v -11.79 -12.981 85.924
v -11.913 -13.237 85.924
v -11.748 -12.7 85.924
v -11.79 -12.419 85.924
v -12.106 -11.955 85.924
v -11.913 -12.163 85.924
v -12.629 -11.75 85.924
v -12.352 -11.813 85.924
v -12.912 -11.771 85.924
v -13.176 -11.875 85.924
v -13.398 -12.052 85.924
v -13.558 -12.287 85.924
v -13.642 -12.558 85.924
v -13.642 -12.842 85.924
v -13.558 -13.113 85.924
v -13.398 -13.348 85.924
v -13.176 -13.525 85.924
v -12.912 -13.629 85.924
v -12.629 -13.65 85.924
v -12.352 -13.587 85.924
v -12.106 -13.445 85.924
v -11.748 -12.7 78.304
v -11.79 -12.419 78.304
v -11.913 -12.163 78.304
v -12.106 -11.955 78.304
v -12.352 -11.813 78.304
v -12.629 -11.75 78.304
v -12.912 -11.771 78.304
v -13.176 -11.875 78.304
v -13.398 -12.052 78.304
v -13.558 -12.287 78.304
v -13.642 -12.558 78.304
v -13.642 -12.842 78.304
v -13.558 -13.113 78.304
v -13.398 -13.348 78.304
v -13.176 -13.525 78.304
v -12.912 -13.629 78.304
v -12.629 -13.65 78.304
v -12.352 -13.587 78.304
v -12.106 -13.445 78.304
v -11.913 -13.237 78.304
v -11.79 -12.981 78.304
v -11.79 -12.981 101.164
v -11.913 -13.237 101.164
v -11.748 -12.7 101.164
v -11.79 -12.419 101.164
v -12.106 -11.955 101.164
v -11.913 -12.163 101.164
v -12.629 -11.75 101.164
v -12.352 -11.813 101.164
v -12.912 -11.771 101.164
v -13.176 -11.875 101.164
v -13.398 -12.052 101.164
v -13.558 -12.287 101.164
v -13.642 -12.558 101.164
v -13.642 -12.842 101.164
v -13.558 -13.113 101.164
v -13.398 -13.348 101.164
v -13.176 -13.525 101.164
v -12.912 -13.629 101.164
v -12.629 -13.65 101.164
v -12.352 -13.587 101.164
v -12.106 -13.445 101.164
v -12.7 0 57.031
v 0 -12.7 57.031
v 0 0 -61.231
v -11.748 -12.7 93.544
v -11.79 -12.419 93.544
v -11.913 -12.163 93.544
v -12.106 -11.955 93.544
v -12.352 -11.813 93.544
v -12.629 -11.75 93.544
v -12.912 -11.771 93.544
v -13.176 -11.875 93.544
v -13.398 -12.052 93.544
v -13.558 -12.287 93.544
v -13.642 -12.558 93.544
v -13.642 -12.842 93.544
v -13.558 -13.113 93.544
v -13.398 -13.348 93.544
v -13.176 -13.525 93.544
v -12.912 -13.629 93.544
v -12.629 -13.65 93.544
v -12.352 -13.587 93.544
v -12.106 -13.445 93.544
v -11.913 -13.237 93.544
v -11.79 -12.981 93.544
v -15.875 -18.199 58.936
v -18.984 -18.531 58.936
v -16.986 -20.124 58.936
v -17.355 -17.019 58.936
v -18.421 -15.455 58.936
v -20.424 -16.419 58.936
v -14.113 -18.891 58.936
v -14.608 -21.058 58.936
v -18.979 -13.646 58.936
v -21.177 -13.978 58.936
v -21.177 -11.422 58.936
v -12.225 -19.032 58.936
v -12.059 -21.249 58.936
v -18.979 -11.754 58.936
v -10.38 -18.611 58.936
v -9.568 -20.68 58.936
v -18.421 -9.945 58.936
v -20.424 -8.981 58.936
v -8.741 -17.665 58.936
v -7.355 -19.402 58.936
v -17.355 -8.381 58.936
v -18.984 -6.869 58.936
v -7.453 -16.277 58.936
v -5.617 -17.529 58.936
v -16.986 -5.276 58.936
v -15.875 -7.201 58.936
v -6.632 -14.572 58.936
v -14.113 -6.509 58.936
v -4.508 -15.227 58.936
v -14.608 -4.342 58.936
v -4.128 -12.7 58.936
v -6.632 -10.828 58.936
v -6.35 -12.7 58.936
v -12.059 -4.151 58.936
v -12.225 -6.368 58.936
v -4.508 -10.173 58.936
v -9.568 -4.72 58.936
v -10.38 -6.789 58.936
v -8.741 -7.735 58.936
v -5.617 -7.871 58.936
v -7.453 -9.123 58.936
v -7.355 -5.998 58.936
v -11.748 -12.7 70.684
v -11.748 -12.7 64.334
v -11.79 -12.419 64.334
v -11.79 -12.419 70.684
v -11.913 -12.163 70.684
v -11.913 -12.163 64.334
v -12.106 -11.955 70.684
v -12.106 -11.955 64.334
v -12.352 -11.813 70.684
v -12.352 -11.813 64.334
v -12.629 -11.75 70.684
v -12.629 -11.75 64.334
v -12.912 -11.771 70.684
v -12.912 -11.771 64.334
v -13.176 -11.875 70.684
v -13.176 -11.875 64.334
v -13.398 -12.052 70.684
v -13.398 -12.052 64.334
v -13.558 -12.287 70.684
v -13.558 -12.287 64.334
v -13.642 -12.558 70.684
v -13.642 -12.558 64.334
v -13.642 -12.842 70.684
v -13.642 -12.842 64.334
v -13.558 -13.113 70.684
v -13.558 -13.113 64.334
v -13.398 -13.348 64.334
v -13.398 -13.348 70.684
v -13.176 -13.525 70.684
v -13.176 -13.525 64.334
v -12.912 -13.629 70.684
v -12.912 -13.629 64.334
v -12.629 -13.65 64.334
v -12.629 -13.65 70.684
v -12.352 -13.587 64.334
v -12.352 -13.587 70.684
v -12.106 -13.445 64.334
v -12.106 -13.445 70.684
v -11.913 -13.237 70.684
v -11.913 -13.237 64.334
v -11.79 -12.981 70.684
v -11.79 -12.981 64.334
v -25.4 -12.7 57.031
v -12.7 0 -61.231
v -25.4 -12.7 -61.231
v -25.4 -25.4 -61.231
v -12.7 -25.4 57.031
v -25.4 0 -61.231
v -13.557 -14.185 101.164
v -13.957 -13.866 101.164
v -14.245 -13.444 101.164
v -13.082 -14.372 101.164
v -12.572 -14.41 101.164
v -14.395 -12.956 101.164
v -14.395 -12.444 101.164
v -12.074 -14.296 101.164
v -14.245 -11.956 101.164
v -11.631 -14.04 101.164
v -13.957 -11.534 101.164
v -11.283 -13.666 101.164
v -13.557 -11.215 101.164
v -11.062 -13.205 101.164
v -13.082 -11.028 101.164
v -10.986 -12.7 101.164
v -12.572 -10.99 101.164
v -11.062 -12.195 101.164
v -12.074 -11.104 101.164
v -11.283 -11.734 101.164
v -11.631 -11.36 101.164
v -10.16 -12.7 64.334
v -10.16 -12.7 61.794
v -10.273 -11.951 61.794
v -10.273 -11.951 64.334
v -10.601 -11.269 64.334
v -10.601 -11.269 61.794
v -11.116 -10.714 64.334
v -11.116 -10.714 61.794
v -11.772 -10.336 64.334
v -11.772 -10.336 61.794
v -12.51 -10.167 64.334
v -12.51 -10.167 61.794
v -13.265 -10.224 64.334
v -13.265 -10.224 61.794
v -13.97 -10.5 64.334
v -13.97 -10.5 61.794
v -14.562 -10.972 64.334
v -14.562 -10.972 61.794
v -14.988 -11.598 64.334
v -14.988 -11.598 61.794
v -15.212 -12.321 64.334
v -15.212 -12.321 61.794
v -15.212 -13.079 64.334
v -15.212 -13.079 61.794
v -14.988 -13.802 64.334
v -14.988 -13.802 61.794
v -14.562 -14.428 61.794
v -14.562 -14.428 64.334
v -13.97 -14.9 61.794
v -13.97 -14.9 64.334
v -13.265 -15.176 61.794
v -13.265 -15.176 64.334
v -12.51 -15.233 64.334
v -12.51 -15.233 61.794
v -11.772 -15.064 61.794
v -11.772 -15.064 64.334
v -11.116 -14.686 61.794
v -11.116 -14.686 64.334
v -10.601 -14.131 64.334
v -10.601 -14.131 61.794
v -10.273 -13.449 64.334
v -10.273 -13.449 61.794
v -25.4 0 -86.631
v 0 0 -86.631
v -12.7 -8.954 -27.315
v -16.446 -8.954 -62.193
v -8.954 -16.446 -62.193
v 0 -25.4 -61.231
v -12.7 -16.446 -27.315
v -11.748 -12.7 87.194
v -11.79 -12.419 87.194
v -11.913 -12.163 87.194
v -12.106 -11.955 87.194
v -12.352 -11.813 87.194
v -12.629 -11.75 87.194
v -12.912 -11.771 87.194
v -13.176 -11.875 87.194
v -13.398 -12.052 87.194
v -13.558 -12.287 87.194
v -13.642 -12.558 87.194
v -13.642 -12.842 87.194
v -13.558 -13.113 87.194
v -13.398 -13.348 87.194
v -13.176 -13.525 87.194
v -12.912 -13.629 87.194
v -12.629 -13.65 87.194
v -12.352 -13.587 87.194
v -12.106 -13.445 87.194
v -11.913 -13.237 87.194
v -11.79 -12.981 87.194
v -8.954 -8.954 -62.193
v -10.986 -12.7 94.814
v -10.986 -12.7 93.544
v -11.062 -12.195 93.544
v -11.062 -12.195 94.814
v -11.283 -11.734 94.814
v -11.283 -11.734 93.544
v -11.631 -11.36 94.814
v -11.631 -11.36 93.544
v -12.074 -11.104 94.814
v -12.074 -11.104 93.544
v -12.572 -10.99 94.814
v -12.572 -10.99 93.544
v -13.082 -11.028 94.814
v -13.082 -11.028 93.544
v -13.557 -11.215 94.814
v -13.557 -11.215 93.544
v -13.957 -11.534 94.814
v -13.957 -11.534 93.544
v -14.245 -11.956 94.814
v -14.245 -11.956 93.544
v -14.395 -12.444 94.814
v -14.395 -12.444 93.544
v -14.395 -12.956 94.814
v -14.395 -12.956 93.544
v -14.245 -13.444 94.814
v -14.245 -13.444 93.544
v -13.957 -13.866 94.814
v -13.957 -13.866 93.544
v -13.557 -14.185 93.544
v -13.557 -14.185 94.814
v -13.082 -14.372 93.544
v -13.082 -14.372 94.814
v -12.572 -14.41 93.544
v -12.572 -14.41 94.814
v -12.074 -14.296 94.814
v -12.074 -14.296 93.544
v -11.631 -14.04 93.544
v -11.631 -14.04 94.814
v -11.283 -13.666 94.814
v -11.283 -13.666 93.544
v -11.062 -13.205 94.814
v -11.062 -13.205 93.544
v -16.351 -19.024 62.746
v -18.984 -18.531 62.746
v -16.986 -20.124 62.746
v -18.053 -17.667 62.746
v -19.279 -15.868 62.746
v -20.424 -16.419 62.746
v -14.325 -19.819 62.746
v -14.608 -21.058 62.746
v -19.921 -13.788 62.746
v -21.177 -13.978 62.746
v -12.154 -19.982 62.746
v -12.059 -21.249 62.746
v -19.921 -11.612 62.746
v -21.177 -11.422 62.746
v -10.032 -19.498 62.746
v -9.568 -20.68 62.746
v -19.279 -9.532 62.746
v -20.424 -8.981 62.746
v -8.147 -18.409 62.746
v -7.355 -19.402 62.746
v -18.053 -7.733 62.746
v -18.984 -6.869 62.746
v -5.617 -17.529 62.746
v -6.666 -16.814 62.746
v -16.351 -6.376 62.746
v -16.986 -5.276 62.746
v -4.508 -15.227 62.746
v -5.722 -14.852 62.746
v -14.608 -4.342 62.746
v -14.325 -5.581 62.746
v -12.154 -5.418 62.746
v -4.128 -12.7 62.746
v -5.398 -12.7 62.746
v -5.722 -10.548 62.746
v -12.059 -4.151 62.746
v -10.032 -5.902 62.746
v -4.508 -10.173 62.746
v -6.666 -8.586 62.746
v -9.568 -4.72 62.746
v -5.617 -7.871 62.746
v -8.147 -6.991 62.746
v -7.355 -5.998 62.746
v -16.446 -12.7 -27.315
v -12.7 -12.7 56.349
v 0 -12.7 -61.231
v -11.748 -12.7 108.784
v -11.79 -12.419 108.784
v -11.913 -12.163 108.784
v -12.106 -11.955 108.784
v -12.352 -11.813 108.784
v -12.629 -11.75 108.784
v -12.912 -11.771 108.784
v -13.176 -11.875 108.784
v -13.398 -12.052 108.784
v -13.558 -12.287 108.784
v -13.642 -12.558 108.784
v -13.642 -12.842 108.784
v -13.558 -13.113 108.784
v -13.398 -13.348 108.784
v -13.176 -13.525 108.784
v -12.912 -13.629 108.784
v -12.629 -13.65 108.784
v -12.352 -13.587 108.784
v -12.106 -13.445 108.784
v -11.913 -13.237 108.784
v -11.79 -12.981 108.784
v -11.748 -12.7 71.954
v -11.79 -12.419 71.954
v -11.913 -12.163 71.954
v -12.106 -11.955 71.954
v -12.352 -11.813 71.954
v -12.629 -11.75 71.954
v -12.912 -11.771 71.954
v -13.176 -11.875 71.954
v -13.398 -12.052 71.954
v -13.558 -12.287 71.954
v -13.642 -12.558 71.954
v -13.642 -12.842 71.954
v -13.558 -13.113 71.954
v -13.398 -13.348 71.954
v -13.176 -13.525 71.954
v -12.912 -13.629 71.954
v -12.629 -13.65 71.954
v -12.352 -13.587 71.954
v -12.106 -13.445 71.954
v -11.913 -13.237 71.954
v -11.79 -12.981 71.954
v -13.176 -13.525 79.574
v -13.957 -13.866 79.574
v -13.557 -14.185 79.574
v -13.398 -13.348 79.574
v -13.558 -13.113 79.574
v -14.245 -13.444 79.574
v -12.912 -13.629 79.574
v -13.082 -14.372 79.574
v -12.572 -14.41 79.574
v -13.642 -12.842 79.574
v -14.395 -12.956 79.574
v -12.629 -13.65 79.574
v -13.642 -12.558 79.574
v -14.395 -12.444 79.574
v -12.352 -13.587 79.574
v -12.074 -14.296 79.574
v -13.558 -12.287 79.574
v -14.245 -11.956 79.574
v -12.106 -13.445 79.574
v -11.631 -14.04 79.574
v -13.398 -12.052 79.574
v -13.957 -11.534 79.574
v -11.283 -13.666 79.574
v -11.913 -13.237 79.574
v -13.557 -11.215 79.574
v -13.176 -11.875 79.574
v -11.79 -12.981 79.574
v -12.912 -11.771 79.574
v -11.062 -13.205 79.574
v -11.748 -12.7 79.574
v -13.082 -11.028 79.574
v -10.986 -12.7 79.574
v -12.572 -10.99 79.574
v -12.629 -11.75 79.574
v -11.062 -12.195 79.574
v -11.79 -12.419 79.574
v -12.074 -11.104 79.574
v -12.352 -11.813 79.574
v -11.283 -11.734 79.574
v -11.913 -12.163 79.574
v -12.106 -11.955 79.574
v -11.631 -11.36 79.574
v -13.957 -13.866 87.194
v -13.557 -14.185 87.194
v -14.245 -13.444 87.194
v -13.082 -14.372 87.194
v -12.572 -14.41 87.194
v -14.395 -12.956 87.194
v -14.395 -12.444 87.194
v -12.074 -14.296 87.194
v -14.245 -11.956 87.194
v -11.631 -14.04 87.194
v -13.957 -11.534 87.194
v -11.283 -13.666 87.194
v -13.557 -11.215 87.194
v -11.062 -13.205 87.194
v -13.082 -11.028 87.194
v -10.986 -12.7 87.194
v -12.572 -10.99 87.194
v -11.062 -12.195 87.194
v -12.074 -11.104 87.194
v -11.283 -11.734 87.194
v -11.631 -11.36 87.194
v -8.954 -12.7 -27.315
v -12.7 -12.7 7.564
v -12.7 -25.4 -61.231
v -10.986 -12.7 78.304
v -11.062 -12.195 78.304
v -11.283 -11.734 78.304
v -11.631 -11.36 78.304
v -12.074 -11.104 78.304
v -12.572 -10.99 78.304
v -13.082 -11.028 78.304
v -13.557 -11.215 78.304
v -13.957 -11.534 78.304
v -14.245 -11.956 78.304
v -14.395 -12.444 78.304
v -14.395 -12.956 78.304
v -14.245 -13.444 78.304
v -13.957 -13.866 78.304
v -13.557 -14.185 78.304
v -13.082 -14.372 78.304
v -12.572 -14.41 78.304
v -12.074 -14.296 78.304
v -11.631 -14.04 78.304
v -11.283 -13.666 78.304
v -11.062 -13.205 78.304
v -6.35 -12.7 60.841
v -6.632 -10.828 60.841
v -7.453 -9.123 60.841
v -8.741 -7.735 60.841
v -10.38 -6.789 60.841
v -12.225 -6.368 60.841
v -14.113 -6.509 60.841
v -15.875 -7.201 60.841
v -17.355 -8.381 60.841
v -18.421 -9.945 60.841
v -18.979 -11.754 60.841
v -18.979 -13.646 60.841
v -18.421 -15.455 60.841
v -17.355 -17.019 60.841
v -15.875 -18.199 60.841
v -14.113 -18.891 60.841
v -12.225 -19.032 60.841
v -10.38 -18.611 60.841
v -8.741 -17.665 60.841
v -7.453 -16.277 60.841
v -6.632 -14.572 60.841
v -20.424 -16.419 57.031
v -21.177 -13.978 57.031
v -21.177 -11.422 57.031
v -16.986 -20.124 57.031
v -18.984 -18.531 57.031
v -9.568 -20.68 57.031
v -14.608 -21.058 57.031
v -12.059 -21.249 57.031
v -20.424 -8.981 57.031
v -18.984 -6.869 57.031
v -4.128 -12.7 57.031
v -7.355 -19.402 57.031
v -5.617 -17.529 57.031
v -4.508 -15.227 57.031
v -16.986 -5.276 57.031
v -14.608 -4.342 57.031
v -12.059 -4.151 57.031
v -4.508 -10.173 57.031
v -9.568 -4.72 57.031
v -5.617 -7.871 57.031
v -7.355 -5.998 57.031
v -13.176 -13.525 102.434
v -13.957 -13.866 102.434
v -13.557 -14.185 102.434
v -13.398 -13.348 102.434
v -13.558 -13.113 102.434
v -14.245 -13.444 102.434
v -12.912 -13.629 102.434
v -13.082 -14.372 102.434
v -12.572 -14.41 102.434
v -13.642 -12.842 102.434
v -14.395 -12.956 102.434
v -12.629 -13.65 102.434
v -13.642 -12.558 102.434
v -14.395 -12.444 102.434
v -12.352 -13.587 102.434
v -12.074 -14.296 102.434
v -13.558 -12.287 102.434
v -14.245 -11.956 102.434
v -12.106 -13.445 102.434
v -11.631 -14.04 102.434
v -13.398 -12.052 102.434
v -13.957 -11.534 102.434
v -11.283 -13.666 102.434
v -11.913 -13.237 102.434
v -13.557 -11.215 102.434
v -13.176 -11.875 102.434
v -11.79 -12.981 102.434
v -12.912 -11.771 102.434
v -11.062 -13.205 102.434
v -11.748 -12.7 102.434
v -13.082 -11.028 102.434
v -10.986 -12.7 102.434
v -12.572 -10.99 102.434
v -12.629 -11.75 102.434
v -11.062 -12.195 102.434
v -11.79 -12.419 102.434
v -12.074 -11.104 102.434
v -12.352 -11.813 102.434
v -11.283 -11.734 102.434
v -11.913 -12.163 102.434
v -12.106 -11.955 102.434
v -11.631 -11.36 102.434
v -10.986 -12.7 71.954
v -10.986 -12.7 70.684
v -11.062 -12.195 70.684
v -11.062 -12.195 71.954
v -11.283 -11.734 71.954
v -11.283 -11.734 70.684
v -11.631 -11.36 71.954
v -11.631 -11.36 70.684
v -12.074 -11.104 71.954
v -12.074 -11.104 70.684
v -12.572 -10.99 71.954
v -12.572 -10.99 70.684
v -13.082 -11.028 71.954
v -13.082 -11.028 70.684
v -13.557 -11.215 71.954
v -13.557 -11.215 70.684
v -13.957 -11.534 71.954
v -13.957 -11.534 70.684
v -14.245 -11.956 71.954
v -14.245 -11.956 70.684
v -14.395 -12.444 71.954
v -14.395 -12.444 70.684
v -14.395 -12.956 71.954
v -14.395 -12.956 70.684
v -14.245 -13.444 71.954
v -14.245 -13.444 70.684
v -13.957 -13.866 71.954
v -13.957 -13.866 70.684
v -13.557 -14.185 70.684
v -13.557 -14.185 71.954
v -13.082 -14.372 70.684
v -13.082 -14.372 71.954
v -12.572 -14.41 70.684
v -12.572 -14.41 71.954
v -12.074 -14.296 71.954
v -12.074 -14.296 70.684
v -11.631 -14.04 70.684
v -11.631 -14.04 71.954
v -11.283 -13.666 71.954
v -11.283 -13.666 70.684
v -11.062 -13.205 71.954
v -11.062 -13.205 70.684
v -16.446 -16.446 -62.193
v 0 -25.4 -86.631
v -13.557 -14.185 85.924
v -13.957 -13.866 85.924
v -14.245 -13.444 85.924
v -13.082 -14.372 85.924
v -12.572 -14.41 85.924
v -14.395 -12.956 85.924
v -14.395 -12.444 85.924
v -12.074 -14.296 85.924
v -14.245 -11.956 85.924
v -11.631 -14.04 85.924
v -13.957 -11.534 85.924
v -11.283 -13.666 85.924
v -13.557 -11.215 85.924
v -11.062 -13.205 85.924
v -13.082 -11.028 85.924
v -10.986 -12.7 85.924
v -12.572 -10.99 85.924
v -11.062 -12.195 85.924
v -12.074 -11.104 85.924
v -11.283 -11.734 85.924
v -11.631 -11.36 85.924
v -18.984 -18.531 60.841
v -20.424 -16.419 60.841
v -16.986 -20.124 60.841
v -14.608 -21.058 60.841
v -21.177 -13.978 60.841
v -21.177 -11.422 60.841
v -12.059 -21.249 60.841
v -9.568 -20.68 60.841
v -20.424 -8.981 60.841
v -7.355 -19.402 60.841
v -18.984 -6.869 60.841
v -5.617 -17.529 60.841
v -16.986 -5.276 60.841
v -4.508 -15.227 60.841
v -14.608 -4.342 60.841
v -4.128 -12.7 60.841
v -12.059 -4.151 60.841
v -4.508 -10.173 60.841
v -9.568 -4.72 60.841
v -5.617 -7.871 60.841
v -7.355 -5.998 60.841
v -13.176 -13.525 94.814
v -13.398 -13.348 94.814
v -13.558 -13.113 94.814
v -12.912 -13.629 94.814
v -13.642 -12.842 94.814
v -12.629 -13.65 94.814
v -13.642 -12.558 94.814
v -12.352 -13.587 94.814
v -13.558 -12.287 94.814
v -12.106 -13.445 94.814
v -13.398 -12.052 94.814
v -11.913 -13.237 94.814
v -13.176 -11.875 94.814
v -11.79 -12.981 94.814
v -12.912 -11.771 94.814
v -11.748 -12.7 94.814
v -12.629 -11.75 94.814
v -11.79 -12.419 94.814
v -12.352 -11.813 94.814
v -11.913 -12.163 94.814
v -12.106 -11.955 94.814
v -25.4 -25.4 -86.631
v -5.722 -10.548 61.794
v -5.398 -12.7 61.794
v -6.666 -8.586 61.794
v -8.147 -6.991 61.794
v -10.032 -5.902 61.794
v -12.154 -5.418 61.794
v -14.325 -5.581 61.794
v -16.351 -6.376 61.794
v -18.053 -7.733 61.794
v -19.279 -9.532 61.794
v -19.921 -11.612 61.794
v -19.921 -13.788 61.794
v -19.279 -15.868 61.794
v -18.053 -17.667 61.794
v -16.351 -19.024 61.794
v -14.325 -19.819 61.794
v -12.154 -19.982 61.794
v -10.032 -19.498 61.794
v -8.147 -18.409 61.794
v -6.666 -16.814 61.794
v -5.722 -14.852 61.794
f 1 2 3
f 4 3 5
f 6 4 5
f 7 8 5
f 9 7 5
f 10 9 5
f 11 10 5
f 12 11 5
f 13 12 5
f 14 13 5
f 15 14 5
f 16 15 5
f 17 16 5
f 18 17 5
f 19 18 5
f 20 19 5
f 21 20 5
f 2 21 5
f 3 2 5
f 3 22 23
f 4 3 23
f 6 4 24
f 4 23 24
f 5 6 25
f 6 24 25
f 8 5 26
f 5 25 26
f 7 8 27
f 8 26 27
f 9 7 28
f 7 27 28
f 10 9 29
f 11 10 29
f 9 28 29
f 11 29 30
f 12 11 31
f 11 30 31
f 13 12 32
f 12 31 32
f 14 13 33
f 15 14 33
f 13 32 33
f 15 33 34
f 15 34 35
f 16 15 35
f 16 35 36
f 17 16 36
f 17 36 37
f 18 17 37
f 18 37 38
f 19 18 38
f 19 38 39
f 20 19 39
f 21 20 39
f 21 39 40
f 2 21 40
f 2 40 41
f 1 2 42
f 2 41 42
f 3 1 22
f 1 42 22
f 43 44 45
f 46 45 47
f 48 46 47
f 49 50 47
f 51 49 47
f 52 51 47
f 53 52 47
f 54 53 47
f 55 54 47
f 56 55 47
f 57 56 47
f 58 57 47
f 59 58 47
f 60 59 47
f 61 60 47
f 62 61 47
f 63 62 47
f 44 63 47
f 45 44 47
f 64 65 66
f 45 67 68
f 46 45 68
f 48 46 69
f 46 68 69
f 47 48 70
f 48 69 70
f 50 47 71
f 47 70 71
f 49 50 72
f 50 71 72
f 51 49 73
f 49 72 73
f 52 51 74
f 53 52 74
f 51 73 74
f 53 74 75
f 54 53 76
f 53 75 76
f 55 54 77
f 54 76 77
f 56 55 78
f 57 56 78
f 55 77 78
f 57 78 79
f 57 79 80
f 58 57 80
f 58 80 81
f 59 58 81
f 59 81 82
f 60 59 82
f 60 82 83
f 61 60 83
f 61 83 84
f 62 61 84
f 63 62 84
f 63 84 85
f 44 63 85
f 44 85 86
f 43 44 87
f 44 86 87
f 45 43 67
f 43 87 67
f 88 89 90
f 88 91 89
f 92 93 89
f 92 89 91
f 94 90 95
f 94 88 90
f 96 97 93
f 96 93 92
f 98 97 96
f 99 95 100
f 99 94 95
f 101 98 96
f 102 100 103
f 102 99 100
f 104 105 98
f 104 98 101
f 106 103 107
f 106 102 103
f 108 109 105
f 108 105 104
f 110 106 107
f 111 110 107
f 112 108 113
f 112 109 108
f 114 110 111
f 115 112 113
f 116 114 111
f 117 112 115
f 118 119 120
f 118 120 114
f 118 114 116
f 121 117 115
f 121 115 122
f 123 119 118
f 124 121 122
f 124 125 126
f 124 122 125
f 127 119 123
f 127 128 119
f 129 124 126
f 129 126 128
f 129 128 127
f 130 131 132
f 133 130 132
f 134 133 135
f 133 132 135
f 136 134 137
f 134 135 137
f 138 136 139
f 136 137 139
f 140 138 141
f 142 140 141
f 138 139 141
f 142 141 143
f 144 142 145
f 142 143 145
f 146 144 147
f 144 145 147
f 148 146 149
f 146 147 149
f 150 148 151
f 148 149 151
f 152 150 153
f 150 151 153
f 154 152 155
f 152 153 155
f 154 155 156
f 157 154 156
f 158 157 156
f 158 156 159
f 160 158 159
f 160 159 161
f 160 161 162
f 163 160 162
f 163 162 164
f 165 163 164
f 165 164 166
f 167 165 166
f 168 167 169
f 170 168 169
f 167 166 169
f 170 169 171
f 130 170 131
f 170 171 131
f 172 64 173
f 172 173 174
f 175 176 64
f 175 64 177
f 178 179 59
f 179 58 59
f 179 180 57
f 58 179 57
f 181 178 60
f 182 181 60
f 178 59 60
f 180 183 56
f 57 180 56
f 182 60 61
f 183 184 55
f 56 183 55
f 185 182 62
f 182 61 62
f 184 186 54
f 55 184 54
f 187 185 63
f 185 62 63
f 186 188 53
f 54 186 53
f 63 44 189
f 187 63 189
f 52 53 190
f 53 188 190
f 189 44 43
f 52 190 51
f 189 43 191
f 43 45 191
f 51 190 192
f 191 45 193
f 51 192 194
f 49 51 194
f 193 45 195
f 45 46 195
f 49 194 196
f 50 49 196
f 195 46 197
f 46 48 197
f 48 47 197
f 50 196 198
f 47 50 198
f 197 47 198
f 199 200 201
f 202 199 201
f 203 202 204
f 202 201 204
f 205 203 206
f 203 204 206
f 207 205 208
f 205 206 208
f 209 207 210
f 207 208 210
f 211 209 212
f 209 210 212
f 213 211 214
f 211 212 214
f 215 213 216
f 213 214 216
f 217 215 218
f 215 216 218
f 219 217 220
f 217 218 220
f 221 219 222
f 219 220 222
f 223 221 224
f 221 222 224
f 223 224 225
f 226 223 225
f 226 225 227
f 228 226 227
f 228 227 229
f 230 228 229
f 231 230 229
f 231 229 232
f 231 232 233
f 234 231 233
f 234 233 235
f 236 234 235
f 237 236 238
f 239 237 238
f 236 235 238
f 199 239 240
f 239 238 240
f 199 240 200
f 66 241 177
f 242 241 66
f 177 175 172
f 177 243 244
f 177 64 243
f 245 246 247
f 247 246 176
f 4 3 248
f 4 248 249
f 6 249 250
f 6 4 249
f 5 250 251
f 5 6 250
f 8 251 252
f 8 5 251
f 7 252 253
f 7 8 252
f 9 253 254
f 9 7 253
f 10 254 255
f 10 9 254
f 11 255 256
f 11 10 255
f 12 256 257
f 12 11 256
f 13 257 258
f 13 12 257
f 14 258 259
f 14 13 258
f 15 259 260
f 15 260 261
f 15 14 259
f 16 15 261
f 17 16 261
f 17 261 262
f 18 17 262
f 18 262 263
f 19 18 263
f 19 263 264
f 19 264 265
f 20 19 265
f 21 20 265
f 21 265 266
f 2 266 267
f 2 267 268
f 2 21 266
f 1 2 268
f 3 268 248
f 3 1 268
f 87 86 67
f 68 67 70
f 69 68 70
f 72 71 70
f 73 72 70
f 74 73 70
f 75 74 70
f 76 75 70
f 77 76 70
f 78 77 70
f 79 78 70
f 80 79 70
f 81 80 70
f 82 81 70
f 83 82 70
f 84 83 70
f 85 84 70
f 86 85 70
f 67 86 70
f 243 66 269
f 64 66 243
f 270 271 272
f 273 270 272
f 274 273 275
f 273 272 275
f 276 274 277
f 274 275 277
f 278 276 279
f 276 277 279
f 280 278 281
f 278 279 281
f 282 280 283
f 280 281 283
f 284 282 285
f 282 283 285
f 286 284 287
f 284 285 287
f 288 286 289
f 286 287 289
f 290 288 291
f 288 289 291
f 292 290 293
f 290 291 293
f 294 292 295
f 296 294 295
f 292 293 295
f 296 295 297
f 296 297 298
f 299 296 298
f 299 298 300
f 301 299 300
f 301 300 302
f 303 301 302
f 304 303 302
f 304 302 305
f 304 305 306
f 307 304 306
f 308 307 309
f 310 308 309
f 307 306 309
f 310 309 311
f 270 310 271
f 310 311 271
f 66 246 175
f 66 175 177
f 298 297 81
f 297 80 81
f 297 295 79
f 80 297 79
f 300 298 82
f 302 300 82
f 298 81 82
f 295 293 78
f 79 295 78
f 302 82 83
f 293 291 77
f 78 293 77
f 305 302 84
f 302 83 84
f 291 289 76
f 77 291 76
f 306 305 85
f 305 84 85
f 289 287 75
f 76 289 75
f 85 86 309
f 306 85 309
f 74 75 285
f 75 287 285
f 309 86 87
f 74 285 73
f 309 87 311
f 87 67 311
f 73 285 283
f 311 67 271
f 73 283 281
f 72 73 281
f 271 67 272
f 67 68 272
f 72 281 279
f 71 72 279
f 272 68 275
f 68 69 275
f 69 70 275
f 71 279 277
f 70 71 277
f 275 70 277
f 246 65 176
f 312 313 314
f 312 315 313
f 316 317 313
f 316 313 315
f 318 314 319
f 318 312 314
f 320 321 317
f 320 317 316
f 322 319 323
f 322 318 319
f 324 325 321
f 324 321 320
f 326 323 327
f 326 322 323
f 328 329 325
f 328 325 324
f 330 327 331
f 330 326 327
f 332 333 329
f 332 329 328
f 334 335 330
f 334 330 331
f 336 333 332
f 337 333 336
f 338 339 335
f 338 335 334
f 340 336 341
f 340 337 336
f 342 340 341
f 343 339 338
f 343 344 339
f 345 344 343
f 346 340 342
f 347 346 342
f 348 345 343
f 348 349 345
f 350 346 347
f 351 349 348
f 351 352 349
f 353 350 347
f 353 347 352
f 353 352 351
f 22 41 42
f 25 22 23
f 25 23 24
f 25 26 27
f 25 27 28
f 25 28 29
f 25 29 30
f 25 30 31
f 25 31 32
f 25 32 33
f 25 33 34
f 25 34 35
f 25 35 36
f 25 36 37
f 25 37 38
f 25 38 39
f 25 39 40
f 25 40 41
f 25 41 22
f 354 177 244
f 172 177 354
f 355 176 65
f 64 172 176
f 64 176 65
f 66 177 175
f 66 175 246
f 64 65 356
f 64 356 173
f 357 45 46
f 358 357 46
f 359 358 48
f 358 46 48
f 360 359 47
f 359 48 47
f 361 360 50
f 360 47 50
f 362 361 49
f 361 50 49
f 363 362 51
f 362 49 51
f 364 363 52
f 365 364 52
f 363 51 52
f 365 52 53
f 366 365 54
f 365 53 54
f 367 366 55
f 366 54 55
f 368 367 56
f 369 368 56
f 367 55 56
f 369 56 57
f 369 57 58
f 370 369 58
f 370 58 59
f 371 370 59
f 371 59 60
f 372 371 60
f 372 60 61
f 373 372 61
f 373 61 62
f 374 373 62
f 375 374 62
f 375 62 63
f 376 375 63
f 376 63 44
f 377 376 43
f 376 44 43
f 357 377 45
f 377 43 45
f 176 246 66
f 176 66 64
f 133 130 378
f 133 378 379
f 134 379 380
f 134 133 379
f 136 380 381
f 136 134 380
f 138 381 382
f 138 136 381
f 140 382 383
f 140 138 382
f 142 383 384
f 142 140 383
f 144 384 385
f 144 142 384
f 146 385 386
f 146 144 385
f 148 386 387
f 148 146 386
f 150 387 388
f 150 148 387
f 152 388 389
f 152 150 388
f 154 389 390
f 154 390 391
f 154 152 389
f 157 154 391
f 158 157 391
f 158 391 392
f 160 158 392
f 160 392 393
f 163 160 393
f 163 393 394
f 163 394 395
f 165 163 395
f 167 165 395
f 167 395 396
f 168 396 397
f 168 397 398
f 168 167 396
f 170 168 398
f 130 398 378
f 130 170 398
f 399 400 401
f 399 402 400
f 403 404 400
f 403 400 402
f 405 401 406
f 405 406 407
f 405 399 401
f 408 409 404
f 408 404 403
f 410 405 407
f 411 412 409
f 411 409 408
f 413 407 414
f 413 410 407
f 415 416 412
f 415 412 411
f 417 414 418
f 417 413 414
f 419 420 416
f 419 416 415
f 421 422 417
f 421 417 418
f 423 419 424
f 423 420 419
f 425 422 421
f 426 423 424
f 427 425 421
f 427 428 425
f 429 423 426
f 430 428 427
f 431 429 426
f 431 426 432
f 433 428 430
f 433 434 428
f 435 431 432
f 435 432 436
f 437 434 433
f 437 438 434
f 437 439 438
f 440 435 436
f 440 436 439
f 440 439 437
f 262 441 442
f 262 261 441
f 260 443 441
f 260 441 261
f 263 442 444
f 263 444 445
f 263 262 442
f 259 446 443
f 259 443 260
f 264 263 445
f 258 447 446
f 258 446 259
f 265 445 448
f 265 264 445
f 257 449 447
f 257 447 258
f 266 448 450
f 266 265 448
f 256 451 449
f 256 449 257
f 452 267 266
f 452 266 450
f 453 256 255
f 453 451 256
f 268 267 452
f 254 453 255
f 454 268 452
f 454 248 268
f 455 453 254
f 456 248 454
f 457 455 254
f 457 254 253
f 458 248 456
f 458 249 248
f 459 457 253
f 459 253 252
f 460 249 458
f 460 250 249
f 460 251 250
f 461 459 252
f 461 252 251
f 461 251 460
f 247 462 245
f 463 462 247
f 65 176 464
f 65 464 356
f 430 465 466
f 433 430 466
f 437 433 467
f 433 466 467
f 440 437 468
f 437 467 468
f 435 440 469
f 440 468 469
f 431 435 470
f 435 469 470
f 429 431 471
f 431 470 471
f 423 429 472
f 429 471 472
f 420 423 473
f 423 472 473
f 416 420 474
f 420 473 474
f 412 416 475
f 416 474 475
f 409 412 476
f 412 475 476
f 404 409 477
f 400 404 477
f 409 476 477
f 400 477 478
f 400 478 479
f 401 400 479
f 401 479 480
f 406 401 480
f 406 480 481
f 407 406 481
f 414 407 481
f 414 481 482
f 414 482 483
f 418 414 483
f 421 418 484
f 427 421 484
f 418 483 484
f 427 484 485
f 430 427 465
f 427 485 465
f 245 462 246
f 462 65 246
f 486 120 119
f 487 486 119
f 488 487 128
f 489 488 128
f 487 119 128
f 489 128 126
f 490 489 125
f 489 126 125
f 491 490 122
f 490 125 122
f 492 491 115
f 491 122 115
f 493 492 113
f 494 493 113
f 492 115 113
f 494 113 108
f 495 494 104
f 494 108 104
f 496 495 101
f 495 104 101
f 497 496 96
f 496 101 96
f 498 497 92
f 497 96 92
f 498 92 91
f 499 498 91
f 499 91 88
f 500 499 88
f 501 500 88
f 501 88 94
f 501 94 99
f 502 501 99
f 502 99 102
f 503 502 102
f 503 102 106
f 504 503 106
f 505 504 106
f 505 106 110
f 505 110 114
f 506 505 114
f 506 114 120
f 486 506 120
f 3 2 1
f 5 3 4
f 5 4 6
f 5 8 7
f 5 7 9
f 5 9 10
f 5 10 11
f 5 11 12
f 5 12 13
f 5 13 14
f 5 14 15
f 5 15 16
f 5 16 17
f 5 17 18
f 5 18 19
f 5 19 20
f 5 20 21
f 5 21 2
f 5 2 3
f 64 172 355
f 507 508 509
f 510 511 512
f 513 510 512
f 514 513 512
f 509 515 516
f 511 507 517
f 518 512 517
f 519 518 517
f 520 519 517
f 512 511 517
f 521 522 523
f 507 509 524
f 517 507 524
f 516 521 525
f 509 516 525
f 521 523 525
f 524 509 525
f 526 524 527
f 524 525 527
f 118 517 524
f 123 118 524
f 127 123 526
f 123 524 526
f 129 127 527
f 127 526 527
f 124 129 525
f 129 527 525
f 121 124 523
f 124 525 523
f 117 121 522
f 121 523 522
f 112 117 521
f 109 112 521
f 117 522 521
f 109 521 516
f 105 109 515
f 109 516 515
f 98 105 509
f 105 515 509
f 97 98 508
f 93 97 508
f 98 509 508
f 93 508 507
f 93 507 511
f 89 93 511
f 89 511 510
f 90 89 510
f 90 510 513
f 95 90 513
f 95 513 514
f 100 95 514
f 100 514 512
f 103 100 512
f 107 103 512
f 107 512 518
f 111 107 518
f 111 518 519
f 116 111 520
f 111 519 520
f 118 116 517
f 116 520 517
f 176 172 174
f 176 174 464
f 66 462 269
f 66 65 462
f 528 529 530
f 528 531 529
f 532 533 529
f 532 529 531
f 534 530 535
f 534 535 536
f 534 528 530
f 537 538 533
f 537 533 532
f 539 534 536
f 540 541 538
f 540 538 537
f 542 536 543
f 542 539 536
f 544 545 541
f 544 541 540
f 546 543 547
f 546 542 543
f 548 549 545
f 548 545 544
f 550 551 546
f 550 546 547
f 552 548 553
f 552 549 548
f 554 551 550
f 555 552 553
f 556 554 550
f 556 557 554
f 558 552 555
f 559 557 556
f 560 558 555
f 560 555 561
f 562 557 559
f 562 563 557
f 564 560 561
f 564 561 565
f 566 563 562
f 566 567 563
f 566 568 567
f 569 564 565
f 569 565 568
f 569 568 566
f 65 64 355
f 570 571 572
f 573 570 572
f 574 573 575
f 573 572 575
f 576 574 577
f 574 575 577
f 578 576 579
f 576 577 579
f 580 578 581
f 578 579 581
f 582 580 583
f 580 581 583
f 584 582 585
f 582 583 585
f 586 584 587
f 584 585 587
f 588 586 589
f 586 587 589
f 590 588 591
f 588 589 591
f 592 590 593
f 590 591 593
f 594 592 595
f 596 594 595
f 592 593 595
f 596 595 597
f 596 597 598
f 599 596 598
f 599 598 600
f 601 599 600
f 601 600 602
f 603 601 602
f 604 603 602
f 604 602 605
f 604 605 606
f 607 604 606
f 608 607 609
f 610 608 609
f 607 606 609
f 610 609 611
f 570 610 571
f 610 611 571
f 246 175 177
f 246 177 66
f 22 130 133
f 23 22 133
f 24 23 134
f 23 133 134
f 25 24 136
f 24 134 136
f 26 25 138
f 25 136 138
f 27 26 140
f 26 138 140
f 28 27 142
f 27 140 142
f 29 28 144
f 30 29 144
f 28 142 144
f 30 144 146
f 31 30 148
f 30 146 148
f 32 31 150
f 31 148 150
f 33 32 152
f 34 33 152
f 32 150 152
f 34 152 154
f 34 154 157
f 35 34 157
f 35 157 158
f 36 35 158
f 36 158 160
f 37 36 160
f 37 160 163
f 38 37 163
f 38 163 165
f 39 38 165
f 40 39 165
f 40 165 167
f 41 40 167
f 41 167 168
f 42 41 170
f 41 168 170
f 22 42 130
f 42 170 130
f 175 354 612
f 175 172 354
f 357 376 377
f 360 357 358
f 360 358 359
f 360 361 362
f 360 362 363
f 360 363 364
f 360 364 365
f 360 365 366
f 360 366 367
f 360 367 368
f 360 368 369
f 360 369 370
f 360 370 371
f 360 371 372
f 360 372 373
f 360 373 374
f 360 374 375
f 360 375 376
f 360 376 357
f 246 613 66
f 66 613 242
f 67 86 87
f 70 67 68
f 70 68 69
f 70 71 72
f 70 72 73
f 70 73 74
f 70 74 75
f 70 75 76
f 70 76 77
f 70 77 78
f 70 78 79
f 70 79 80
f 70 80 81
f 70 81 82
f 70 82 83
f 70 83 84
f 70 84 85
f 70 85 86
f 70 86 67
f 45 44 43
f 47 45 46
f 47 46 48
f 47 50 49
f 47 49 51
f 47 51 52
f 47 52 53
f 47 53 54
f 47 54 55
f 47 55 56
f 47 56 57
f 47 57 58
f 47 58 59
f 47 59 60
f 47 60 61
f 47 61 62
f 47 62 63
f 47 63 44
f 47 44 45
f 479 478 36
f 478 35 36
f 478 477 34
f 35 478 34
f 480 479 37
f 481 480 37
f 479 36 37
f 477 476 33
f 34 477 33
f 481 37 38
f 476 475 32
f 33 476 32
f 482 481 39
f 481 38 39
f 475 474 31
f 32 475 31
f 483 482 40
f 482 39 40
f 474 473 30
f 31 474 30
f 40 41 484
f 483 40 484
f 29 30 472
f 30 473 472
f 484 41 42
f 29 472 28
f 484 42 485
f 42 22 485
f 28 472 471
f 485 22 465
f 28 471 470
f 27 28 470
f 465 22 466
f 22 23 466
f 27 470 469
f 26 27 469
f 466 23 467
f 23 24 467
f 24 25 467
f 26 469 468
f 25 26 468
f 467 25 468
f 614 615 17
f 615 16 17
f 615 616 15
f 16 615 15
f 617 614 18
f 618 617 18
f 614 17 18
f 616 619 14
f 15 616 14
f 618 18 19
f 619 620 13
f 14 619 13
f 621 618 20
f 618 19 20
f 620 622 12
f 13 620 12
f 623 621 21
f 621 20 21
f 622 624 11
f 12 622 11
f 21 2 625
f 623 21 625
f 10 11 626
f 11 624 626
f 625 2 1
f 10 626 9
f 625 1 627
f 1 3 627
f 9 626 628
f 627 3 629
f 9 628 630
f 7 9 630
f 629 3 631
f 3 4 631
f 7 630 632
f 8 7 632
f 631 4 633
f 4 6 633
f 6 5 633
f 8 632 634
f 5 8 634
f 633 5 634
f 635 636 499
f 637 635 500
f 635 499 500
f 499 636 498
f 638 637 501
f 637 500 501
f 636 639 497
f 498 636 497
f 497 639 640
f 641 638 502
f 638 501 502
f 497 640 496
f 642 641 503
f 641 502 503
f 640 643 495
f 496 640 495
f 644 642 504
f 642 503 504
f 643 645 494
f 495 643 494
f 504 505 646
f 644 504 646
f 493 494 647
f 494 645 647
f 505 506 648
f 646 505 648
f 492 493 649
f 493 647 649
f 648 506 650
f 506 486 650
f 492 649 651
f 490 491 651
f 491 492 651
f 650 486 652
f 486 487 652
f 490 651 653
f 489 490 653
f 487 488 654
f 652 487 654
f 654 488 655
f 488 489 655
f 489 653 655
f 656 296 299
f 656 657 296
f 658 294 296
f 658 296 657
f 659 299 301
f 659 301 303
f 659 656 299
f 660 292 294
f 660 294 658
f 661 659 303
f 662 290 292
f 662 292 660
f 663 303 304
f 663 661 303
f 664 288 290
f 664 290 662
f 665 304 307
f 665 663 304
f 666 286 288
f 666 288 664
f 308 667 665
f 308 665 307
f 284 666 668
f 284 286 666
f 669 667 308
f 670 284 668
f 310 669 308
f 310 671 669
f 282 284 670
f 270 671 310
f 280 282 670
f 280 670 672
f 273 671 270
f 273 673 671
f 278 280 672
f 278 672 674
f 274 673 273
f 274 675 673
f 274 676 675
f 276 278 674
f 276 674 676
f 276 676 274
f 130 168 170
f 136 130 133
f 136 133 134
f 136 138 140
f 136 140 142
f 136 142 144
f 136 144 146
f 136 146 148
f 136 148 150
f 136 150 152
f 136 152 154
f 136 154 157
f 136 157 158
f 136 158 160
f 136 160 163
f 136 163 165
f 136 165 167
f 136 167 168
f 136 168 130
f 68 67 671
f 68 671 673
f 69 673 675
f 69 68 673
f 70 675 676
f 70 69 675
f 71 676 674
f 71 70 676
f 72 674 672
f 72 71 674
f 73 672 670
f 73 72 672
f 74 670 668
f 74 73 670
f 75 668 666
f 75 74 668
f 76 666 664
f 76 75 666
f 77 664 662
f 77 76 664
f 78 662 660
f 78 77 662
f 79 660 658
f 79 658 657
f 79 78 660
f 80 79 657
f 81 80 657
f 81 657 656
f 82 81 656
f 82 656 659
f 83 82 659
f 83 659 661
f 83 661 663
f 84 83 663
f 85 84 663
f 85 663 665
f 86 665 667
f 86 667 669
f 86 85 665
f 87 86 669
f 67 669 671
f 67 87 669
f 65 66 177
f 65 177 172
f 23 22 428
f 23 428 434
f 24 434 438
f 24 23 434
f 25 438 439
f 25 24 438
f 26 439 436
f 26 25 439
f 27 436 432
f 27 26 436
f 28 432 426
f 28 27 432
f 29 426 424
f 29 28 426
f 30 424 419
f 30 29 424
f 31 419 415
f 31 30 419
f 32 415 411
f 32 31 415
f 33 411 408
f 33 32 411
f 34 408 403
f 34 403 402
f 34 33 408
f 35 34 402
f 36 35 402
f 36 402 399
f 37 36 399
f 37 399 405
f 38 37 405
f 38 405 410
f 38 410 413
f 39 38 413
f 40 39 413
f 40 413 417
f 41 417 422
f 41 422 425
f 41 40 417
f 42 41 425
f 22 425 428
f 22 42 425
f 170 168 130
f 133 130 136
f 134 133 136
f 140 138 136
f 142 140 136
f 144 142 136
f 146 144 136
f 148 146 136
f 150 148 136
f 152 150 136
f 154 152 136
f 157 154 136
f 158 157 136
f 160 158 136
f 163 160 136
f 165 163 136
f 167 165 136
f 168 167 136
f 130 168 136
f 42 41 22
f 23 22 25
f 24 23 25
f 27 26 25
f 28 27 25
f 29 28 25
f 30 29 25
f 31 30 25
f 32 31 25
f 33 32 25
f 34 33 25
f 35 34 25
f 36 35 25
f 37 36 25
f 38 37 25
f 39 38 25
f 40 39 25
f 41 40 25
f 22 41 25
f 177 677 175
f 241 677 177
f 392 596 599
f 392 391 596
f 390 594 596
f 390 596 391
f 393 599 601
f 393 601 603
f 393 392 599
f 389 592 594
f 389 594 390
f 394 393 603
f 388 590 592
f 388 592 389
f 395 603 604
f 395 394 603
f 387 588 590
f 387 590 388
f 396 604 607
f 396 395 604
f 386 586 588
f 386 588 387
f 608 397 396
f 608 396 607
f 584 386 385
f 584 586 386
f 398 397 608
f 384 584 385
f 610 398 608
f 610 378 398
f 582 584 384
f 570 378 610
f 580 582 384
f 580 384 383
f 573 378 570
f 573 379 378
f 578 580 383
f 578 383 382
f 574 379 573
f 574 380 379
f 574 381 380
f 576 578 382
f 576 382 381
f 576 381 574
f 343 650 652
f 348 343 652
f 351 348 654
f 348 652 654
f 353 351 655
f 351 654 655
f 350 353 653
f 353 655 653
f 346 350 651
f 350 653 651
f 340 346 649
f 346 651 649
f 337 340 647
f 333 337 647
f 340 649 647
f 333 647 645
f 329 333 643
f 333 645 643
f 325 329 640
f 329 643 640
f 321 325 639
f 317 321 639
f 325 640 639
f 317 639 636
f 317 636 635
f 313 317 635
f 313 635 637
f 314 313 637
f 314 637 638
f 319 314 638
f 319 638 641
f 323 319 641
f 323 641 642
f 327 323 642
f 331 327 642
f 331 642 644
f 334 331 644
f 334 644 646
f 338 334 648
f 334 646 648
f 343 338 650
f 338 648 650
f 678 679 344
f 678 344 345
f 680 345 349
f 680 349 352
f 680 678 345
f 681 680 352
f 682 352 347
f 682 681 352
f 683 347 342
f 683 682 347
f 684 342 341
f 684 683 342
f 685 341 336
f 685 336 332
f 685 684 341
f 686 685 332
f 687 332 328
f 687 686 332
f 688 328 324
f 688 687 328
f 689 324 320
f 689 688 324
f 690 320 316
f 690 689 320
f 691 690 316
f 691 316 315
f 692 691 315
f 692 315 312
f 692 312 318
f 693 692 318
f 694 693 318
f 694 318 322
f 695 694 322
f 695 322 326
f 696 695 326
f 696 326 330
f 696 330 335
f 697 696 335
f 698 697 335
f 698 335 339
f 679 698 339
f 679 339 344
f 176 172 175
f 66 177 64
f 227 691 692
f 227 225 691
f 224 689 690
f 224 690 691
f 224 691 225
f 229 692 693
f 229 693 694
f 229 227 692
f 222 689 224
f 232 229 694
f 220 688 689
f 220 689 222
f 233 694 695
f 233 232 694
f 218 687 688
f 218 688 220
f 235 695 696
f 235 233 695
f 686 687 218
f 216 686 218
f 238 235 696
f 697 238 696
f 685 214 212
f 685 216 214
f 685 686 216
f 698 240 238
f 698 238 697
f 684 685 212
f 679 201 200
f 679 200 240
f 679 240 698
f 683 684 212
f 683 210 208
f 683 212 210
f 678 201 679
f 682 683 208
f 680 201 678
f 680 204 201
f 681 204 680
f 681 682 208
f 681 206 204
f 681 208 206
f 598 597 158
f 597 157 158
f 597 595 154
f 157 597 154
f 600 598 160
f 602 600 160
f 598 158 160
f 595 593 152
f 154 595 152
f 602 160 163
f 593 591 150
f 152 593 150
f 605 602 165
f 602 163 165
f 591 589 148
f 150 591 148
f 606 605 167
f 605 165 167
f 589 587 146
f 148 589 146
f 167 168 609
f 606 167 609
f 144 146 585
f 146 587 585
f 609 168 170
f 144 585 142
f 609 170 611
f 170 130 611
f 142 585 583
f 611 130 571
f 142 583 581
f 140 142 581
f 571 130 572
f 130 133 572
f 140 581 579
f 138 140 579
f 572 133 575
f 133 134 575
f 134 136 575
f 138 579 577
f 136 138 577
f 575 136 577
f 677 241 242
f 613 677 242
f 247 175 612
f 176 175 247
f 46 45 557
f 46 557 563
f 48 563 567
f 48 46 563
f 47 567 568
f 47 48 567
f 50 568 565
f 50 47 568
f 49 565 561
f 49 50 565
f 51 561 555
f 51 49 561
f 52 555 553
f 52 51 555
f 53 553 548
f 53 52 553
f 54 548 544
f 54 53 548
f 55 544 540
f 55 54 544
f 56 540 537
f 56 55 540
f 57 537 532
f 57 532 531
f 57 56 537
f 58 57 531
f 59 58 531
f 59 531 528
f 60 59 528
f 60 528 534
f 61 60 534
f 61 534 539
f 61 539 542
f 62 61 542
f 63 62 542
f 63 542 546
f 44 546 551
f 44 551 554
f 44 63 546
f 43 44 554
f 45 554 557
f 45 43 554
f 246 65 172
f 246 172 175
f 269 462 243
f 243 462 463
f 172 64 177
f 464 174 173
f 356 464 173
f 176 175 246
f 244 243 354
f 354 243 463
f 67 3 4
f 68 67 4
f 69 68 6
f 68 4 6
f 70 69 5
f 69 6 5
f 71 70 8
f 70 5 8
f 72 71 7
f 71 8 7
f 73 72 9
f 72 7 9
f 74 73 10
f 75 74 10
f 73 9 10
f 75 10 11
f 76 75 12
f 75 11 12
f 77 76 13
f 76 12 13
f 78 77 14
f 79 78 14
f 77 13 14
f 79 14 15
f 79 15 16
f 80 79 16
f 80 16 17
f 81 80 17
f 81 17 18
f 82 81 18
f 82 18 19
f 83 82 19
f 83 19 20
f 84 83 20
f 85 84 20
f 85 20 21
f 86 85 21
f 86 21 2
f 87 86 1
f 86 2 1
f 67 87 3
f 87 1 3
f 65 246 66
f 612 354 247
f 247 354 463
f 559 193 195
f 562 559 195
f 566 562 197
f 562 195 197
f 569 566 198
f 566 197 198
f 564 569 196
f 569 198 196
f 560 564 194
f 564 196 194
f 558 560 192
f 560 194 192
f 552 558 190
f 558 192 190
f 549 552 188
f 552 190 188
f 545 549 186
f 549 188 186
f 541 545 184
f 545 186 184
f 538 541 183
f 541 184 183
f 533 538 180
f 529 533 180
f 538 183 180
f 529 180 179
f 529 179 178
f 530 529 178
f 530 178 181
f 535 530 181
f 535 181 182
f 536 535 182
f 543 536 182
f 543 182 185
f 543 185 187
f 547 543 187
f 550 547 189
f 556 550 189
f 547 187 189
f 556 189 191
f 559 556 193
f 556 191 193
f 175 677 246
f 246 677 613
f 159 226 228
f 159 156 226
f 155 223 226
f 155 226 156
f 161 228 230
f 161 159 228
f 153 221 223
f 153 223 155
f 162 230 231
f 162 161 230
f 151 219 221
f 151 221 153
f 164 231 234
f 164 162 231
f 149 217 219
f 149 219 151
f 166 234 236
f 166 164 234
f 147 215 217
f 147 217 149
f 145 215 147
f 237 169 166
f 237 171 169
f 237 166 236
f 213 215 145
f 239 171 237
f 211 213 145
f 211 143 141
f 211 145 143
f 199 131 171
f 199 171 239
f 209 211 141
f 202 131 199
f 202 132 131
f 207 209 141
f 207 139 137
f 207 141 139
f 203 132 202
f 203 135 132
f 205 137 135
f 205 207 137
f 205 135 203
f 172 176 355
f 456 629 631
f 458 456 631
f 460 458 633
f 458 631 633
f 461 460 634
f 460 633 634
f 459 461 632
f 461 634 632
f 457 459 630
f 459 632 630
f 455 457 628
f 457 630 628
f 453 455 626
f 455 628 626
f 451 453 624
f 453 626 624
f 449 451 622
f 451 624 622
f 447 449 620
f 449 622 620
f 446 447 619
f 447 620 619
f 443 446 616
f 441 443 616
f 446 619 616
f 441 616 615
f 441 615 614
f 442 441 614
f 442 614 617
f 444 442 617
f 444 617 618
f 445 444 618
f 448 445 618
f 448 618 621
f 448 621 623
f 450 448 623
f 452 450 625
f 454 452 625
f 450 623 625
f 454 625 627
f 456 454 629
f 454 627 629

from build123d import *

# Parameters (mm, degrees)
F18_R     = 8.5725
F18_R_2   = 6.35
F19_DEPTH = 1.905
F20_DEPTH = 3.81
F21_R     = 7.3025
F21_R_2   = 6.35
F22_DEPTH = 0.9525
F21_R_3   = 8.5725
F23_DEPTH = 1.905
F24_R     = 2.54
F25_DEPTH = 2.54
F26_R     = 0.9525
F27_DEPTH = 6.35
F28_R     = 1.7145
F28_R_2   = 0.9525
F29_DEPTH = 1.27
F30_DEPTH = 7.62
F31_R     = 1.7145
F31_R_2   = 0.9525
F32_DEPTH = 1.27
F33_DEPTH = 7.62
F34_R     = 1.7145
F34_R_2   = 0.9525
F35_DEPTH = 1.27
F36_DEPTH = 7.62
F37_R     = 1.7145
F37_R_2   = 0.9525
F38_DEPTH = 1.27
F39_DEPTH = 7.62
F40_R     = 1.7145
F40_R_2   = 0.9525
F41_DEPTH = 1.27
F42_DEPTH = 7.62
F43_DEPTH = 12.7
F44_DEPTH = 12.7
F45_DEPTH = 12.7
F46_DEPTH = 12.7
F47_DEPTH = 25.4
F48_DEPTH = 25.4
F49_DEPTH = 118.2624
F15_W     = 25.4
F15_H     = 25.4
F50_DEPTH = 25.4


with BuildPart() as f19:
    # F18 (on face) → F19 (new body)
    with BuildSketch(Plane.XY.offset(57.0310650853)):
        with Locations((-12.7000000462, -12.7)):
            Circle(F18_R)
        with Locations((-12.7000000462, -12.7)):
            Circle(F18_R_2, mode=Mode.SUBTRACT)
    extrude(amount=F19_DEPTH)

    # F18 (on face) → F20 (join)
    with BuildSketch(Plane.XY.offset(57.0310650853)):
        with Locations((-12.7000000462, -12.7)):
            Circle(F18_R_2)
    extrude(amount=F20_DEPTH)

    # F21 (on face) → F22 (join)
    with BuildSketch(Plane.XY.offset(60.8410650853)):
        with Locations((-12.7000000462, -12.7)):
            Circle(F21_R)
        with Locations((-12.7000000462, -12.7)):
            Circle(F21_R_2, mode=Mode.SUBTRACT)
        with Locations((-12.7000000462, -12.7)):
            Circle(F21_R_2)
    extrude(amount=F22_DEPTH)

    # F21 (on face) → F23 (join)
    with BuildSketch(Plane.XY.offset(60.8410650853)):
        with Locations((-12.7000000462, -12.7)):
            Circle(F21_R_3)
        with Locations((-12.7000000462, -12.7)):
            Circle(F21_R, mode=Mode.SUBTRACT)
    extrude(amount=F23_DEPTH)

    # F24 (on face) → F25 (join)
    with BuildSketch(Plane.XY.offset(61.7935650853)):
        with Locations((-12.7000000462, -12.7)):
            Circle(F24_R)
    extrude(amount=F25_DEPTH)

    # F26 (on face) → F27 (join)
    with BuildSketch(Plane.XY.offset(64.3335650853)):
        with Locations((-12.7000000462, -12.7)):
            Circle(F26_R)
    extrude(amount=F27_DEPTH)


with BuildPart() as f29:
    # F28 (on face) → F29 (new body)
    with BuildSketch(Plane.XY.offset(70.6835650853)):
        with Locations((-12.7000000462, -12.7)):
            Circle(F28_R)
        with Locations((-12.7000000462, -12.7)):
            Circle(F28_R_2, mode=Mode.SUBTRACT)
    extrude(amount=F29_DEPTH)


with BuildPart() as f30:
    # F30 (new): a face of the model
    f30_faces = [f19.part.faces().sort_by_distance(p)[0] for p in [
        (-12.7000000462, -12.7, 70.6835650853),
    ]]
    extrude(f30_faces, amount=F30_DEPTH)


with BuildPart() as f32:
    # F31 (on face) → F32 (new body)
    with BuildSketch(Plane.XY.offset(78.3035650853)):
        with Locations((-12.7000000462, -12.7)):
            Circle(F31_R)
        with Locations((-12.7000000462, -12.7)):
            Circle(F31_R_2, mode=Mode.SUBTRACT)
    extrude(amount=F32_DEPTH)


with BuildPart() as f33:
    # F33 (new): a face of the model
    f33_faces = [f30.part.faces().sort_by_distance(p)[0] for p in [
        (-12.7000000462, -12.7, 78.3035650853),
    ]]
    extrude(f33_faces, amount=F33_DEPTH)


with BuildPart() as f35:
    # F34 (on face) → F35 (new body)
    with BuildSketch(Plane.XY.offset(85.9235650853)):
        with Locations((-12.7000000462, -12.7)):
            Circle(F34_R)
        with Locations((-12.7000000462, -12.7)):
            Circle(F34_R_2, mode=Mode.SUBTRACT)
    extrude(amount=F35_DEPTH)


with BuildPart() as f36:
    # F36 (new): a face of the model
    f36_faces = [f33.part.faces().sort_by_distance(p)[0] for p in [
        (-12.7000000462, -12.7, 85.9235650853),
    ]]
    extrude(f36_faces, amount=F36_DEPTH)


with BuildPart() as f38:
    # F37 (on face) → F38 (new body)
    with BuildSketch(Plane.XY.offset(93.5435650853)):
        with Locations((-12.7000000462, -12.7)):
            Circle(F37_R)
        with Locations((-12.7000000462, -12.7)):
            Circle(F37_R_2, mode=Mode.SUBTRACT)
    extrude(amount=F38_DEPTH)


with BuildPart() as f39:
    # F39 (new): a face of the model
    f39_faces = [f36.part.faces().sort_by_distance(p)[0] for p in [
        (-12.7000000462, -12.7, 93.5435650853),
    ]]
    extrude(f39_faces, amount=F39_DEPTH)


with BuildPart() as f41:
    # F40 (on face) → F41 (new body)
    with BuildSketch(Plane.XY.offset(101.1635650853)):
        with Locations((-12.7000000462, -12.7)):
            Circle(F40_R)
        with Locations((-12.7000000462, -12.7)):
            Circle(F40_R_2, mode=Mode.SUBTRACT)
    extrude(amount=F41_DEPTH)


with BuildPart() as f42:
    # F42 (new): a face of the model
    f42_faces = [f39.part.faces().sort_by_distance(p)[0] for p in [
        (-12.7000000462, -12.7, 101.1635650853),
    ]]
    extrude(f42_faces, amount=F42_DEPTH)


with BuildPart() as f43:
    # F3 (on face) → F43 (new body)
    with BuildSketch(Plane(origin=(-3.2689159971, -3.2689159971, -0.3510433846), x_dir=(-0.7091308298, 0.7010461896, 0.0752841698), z_dir=(0.7050769222, 0.7050769222, 0.0757170234))):
        Polygon((13.2994979292, 56.7050340318), (-4.6097502176, 58.0610689933), (-4.6097502176, -60.8812920634), align=None)
    extrude(amount=-F43_DEPTH)

    # F11 (on face) → F44 (join)
    with BuildSketch(Plane(origin=(-21.9854641777, -21.9854640177, 2.3609819607), x_dir=(0.7091308273, -0.7010461922, 0.0752841701), z_dir=(-0.7050769248, -0.7050769196, 0.0757170232))):
        Polygon((13.0941481152, 53.9929641088), (-4.815099966, 55.3489990703), (-4.815099966, -63.5933619865), align=None)
    extrude(amount=-F44_DEPTH)

    # F7 (on face) → F45 (join)
    with BuildSketch(Plane(origin=(-9.3582740439, 9.3582740439, 1.0049692917), x_dir=(-0.7091308298, -0.7010461896, -0.0752841698), z_dir=(-0.7050769222, 0.7050769222, 0.0757170234))):
        Polygon((22.6216732953, 58.0610689933), (4.7124251485, 56.7050340318), (22.6216732953, -60.8812920634), align=None)
    extrude(amount=-F45_DEPTH)

    # F13 (on face) → F46 (join)
    with BuildSketch(Plane(origin=(9.3582740435, -9.3582741116, 1.0049692989), x_dir=(-0.7091308324, -0.701046187, 0.0752841696), z_dir=(-0.7050769196, 0.7050769247, -0.0757170237))):
        Polygon((13.19682295, -63.5933619865), (31.1060711623, 53.9929641088), (13.19682295, 55.3489990703), align=None)
    extrude(amount=F46_DEPTH)


with BuildPart() as f47:
    # F9 (on face) → F47 (new body)
    with BuildSketch(Plane.XZ.offset(25.4)):
        Polygon((-12.7000000924, 57.0310650853), (-25.4, -61.2313349147), (0, -61.2313349147), align=None)
    extrude(amount=-F47_DEPTH)


with BuildPart() as f48:
    # F0 (on Right) → F48 (new body)
    with BuildSketch(Plane.YZ):
        Polygon((-25.4, -61.2313349147), (0, -61.2313349147), (-12.7, 57.0310650853), align=None)
    extrude(amount=-F48_DEPTH)


with BuildPart() as f49:
    # F17 (on 3pt) → F49 (new body)
    with BuildSketch(Plane.XY.offset(57.0310650853)):
        Polygon((0, -12.7), (-12.7, 0), (-25.4, -12.7), (-12.7000000924, -25.4), align=None)
    extrude(amount=-F49_DEPTH)


with BuildPart() as f50:
    # F15 (on face) → F50 (new body)
    with BuildSketch(Plane.XY.offset(-86.6313349147)):
        with Locations((-12.7, -12.7)):
            Rectangle(F15_W, F15_H)
    extrude(amount=F50_DEPTH)


solid = Compound([f19.part, f29.part, f30.part, f32.part, f33.part, f35.part, f36.part, f38.part, f39.part, f41.part, f42.part, f43.part, f47.part, f48.part, f49.part, f50.part])
